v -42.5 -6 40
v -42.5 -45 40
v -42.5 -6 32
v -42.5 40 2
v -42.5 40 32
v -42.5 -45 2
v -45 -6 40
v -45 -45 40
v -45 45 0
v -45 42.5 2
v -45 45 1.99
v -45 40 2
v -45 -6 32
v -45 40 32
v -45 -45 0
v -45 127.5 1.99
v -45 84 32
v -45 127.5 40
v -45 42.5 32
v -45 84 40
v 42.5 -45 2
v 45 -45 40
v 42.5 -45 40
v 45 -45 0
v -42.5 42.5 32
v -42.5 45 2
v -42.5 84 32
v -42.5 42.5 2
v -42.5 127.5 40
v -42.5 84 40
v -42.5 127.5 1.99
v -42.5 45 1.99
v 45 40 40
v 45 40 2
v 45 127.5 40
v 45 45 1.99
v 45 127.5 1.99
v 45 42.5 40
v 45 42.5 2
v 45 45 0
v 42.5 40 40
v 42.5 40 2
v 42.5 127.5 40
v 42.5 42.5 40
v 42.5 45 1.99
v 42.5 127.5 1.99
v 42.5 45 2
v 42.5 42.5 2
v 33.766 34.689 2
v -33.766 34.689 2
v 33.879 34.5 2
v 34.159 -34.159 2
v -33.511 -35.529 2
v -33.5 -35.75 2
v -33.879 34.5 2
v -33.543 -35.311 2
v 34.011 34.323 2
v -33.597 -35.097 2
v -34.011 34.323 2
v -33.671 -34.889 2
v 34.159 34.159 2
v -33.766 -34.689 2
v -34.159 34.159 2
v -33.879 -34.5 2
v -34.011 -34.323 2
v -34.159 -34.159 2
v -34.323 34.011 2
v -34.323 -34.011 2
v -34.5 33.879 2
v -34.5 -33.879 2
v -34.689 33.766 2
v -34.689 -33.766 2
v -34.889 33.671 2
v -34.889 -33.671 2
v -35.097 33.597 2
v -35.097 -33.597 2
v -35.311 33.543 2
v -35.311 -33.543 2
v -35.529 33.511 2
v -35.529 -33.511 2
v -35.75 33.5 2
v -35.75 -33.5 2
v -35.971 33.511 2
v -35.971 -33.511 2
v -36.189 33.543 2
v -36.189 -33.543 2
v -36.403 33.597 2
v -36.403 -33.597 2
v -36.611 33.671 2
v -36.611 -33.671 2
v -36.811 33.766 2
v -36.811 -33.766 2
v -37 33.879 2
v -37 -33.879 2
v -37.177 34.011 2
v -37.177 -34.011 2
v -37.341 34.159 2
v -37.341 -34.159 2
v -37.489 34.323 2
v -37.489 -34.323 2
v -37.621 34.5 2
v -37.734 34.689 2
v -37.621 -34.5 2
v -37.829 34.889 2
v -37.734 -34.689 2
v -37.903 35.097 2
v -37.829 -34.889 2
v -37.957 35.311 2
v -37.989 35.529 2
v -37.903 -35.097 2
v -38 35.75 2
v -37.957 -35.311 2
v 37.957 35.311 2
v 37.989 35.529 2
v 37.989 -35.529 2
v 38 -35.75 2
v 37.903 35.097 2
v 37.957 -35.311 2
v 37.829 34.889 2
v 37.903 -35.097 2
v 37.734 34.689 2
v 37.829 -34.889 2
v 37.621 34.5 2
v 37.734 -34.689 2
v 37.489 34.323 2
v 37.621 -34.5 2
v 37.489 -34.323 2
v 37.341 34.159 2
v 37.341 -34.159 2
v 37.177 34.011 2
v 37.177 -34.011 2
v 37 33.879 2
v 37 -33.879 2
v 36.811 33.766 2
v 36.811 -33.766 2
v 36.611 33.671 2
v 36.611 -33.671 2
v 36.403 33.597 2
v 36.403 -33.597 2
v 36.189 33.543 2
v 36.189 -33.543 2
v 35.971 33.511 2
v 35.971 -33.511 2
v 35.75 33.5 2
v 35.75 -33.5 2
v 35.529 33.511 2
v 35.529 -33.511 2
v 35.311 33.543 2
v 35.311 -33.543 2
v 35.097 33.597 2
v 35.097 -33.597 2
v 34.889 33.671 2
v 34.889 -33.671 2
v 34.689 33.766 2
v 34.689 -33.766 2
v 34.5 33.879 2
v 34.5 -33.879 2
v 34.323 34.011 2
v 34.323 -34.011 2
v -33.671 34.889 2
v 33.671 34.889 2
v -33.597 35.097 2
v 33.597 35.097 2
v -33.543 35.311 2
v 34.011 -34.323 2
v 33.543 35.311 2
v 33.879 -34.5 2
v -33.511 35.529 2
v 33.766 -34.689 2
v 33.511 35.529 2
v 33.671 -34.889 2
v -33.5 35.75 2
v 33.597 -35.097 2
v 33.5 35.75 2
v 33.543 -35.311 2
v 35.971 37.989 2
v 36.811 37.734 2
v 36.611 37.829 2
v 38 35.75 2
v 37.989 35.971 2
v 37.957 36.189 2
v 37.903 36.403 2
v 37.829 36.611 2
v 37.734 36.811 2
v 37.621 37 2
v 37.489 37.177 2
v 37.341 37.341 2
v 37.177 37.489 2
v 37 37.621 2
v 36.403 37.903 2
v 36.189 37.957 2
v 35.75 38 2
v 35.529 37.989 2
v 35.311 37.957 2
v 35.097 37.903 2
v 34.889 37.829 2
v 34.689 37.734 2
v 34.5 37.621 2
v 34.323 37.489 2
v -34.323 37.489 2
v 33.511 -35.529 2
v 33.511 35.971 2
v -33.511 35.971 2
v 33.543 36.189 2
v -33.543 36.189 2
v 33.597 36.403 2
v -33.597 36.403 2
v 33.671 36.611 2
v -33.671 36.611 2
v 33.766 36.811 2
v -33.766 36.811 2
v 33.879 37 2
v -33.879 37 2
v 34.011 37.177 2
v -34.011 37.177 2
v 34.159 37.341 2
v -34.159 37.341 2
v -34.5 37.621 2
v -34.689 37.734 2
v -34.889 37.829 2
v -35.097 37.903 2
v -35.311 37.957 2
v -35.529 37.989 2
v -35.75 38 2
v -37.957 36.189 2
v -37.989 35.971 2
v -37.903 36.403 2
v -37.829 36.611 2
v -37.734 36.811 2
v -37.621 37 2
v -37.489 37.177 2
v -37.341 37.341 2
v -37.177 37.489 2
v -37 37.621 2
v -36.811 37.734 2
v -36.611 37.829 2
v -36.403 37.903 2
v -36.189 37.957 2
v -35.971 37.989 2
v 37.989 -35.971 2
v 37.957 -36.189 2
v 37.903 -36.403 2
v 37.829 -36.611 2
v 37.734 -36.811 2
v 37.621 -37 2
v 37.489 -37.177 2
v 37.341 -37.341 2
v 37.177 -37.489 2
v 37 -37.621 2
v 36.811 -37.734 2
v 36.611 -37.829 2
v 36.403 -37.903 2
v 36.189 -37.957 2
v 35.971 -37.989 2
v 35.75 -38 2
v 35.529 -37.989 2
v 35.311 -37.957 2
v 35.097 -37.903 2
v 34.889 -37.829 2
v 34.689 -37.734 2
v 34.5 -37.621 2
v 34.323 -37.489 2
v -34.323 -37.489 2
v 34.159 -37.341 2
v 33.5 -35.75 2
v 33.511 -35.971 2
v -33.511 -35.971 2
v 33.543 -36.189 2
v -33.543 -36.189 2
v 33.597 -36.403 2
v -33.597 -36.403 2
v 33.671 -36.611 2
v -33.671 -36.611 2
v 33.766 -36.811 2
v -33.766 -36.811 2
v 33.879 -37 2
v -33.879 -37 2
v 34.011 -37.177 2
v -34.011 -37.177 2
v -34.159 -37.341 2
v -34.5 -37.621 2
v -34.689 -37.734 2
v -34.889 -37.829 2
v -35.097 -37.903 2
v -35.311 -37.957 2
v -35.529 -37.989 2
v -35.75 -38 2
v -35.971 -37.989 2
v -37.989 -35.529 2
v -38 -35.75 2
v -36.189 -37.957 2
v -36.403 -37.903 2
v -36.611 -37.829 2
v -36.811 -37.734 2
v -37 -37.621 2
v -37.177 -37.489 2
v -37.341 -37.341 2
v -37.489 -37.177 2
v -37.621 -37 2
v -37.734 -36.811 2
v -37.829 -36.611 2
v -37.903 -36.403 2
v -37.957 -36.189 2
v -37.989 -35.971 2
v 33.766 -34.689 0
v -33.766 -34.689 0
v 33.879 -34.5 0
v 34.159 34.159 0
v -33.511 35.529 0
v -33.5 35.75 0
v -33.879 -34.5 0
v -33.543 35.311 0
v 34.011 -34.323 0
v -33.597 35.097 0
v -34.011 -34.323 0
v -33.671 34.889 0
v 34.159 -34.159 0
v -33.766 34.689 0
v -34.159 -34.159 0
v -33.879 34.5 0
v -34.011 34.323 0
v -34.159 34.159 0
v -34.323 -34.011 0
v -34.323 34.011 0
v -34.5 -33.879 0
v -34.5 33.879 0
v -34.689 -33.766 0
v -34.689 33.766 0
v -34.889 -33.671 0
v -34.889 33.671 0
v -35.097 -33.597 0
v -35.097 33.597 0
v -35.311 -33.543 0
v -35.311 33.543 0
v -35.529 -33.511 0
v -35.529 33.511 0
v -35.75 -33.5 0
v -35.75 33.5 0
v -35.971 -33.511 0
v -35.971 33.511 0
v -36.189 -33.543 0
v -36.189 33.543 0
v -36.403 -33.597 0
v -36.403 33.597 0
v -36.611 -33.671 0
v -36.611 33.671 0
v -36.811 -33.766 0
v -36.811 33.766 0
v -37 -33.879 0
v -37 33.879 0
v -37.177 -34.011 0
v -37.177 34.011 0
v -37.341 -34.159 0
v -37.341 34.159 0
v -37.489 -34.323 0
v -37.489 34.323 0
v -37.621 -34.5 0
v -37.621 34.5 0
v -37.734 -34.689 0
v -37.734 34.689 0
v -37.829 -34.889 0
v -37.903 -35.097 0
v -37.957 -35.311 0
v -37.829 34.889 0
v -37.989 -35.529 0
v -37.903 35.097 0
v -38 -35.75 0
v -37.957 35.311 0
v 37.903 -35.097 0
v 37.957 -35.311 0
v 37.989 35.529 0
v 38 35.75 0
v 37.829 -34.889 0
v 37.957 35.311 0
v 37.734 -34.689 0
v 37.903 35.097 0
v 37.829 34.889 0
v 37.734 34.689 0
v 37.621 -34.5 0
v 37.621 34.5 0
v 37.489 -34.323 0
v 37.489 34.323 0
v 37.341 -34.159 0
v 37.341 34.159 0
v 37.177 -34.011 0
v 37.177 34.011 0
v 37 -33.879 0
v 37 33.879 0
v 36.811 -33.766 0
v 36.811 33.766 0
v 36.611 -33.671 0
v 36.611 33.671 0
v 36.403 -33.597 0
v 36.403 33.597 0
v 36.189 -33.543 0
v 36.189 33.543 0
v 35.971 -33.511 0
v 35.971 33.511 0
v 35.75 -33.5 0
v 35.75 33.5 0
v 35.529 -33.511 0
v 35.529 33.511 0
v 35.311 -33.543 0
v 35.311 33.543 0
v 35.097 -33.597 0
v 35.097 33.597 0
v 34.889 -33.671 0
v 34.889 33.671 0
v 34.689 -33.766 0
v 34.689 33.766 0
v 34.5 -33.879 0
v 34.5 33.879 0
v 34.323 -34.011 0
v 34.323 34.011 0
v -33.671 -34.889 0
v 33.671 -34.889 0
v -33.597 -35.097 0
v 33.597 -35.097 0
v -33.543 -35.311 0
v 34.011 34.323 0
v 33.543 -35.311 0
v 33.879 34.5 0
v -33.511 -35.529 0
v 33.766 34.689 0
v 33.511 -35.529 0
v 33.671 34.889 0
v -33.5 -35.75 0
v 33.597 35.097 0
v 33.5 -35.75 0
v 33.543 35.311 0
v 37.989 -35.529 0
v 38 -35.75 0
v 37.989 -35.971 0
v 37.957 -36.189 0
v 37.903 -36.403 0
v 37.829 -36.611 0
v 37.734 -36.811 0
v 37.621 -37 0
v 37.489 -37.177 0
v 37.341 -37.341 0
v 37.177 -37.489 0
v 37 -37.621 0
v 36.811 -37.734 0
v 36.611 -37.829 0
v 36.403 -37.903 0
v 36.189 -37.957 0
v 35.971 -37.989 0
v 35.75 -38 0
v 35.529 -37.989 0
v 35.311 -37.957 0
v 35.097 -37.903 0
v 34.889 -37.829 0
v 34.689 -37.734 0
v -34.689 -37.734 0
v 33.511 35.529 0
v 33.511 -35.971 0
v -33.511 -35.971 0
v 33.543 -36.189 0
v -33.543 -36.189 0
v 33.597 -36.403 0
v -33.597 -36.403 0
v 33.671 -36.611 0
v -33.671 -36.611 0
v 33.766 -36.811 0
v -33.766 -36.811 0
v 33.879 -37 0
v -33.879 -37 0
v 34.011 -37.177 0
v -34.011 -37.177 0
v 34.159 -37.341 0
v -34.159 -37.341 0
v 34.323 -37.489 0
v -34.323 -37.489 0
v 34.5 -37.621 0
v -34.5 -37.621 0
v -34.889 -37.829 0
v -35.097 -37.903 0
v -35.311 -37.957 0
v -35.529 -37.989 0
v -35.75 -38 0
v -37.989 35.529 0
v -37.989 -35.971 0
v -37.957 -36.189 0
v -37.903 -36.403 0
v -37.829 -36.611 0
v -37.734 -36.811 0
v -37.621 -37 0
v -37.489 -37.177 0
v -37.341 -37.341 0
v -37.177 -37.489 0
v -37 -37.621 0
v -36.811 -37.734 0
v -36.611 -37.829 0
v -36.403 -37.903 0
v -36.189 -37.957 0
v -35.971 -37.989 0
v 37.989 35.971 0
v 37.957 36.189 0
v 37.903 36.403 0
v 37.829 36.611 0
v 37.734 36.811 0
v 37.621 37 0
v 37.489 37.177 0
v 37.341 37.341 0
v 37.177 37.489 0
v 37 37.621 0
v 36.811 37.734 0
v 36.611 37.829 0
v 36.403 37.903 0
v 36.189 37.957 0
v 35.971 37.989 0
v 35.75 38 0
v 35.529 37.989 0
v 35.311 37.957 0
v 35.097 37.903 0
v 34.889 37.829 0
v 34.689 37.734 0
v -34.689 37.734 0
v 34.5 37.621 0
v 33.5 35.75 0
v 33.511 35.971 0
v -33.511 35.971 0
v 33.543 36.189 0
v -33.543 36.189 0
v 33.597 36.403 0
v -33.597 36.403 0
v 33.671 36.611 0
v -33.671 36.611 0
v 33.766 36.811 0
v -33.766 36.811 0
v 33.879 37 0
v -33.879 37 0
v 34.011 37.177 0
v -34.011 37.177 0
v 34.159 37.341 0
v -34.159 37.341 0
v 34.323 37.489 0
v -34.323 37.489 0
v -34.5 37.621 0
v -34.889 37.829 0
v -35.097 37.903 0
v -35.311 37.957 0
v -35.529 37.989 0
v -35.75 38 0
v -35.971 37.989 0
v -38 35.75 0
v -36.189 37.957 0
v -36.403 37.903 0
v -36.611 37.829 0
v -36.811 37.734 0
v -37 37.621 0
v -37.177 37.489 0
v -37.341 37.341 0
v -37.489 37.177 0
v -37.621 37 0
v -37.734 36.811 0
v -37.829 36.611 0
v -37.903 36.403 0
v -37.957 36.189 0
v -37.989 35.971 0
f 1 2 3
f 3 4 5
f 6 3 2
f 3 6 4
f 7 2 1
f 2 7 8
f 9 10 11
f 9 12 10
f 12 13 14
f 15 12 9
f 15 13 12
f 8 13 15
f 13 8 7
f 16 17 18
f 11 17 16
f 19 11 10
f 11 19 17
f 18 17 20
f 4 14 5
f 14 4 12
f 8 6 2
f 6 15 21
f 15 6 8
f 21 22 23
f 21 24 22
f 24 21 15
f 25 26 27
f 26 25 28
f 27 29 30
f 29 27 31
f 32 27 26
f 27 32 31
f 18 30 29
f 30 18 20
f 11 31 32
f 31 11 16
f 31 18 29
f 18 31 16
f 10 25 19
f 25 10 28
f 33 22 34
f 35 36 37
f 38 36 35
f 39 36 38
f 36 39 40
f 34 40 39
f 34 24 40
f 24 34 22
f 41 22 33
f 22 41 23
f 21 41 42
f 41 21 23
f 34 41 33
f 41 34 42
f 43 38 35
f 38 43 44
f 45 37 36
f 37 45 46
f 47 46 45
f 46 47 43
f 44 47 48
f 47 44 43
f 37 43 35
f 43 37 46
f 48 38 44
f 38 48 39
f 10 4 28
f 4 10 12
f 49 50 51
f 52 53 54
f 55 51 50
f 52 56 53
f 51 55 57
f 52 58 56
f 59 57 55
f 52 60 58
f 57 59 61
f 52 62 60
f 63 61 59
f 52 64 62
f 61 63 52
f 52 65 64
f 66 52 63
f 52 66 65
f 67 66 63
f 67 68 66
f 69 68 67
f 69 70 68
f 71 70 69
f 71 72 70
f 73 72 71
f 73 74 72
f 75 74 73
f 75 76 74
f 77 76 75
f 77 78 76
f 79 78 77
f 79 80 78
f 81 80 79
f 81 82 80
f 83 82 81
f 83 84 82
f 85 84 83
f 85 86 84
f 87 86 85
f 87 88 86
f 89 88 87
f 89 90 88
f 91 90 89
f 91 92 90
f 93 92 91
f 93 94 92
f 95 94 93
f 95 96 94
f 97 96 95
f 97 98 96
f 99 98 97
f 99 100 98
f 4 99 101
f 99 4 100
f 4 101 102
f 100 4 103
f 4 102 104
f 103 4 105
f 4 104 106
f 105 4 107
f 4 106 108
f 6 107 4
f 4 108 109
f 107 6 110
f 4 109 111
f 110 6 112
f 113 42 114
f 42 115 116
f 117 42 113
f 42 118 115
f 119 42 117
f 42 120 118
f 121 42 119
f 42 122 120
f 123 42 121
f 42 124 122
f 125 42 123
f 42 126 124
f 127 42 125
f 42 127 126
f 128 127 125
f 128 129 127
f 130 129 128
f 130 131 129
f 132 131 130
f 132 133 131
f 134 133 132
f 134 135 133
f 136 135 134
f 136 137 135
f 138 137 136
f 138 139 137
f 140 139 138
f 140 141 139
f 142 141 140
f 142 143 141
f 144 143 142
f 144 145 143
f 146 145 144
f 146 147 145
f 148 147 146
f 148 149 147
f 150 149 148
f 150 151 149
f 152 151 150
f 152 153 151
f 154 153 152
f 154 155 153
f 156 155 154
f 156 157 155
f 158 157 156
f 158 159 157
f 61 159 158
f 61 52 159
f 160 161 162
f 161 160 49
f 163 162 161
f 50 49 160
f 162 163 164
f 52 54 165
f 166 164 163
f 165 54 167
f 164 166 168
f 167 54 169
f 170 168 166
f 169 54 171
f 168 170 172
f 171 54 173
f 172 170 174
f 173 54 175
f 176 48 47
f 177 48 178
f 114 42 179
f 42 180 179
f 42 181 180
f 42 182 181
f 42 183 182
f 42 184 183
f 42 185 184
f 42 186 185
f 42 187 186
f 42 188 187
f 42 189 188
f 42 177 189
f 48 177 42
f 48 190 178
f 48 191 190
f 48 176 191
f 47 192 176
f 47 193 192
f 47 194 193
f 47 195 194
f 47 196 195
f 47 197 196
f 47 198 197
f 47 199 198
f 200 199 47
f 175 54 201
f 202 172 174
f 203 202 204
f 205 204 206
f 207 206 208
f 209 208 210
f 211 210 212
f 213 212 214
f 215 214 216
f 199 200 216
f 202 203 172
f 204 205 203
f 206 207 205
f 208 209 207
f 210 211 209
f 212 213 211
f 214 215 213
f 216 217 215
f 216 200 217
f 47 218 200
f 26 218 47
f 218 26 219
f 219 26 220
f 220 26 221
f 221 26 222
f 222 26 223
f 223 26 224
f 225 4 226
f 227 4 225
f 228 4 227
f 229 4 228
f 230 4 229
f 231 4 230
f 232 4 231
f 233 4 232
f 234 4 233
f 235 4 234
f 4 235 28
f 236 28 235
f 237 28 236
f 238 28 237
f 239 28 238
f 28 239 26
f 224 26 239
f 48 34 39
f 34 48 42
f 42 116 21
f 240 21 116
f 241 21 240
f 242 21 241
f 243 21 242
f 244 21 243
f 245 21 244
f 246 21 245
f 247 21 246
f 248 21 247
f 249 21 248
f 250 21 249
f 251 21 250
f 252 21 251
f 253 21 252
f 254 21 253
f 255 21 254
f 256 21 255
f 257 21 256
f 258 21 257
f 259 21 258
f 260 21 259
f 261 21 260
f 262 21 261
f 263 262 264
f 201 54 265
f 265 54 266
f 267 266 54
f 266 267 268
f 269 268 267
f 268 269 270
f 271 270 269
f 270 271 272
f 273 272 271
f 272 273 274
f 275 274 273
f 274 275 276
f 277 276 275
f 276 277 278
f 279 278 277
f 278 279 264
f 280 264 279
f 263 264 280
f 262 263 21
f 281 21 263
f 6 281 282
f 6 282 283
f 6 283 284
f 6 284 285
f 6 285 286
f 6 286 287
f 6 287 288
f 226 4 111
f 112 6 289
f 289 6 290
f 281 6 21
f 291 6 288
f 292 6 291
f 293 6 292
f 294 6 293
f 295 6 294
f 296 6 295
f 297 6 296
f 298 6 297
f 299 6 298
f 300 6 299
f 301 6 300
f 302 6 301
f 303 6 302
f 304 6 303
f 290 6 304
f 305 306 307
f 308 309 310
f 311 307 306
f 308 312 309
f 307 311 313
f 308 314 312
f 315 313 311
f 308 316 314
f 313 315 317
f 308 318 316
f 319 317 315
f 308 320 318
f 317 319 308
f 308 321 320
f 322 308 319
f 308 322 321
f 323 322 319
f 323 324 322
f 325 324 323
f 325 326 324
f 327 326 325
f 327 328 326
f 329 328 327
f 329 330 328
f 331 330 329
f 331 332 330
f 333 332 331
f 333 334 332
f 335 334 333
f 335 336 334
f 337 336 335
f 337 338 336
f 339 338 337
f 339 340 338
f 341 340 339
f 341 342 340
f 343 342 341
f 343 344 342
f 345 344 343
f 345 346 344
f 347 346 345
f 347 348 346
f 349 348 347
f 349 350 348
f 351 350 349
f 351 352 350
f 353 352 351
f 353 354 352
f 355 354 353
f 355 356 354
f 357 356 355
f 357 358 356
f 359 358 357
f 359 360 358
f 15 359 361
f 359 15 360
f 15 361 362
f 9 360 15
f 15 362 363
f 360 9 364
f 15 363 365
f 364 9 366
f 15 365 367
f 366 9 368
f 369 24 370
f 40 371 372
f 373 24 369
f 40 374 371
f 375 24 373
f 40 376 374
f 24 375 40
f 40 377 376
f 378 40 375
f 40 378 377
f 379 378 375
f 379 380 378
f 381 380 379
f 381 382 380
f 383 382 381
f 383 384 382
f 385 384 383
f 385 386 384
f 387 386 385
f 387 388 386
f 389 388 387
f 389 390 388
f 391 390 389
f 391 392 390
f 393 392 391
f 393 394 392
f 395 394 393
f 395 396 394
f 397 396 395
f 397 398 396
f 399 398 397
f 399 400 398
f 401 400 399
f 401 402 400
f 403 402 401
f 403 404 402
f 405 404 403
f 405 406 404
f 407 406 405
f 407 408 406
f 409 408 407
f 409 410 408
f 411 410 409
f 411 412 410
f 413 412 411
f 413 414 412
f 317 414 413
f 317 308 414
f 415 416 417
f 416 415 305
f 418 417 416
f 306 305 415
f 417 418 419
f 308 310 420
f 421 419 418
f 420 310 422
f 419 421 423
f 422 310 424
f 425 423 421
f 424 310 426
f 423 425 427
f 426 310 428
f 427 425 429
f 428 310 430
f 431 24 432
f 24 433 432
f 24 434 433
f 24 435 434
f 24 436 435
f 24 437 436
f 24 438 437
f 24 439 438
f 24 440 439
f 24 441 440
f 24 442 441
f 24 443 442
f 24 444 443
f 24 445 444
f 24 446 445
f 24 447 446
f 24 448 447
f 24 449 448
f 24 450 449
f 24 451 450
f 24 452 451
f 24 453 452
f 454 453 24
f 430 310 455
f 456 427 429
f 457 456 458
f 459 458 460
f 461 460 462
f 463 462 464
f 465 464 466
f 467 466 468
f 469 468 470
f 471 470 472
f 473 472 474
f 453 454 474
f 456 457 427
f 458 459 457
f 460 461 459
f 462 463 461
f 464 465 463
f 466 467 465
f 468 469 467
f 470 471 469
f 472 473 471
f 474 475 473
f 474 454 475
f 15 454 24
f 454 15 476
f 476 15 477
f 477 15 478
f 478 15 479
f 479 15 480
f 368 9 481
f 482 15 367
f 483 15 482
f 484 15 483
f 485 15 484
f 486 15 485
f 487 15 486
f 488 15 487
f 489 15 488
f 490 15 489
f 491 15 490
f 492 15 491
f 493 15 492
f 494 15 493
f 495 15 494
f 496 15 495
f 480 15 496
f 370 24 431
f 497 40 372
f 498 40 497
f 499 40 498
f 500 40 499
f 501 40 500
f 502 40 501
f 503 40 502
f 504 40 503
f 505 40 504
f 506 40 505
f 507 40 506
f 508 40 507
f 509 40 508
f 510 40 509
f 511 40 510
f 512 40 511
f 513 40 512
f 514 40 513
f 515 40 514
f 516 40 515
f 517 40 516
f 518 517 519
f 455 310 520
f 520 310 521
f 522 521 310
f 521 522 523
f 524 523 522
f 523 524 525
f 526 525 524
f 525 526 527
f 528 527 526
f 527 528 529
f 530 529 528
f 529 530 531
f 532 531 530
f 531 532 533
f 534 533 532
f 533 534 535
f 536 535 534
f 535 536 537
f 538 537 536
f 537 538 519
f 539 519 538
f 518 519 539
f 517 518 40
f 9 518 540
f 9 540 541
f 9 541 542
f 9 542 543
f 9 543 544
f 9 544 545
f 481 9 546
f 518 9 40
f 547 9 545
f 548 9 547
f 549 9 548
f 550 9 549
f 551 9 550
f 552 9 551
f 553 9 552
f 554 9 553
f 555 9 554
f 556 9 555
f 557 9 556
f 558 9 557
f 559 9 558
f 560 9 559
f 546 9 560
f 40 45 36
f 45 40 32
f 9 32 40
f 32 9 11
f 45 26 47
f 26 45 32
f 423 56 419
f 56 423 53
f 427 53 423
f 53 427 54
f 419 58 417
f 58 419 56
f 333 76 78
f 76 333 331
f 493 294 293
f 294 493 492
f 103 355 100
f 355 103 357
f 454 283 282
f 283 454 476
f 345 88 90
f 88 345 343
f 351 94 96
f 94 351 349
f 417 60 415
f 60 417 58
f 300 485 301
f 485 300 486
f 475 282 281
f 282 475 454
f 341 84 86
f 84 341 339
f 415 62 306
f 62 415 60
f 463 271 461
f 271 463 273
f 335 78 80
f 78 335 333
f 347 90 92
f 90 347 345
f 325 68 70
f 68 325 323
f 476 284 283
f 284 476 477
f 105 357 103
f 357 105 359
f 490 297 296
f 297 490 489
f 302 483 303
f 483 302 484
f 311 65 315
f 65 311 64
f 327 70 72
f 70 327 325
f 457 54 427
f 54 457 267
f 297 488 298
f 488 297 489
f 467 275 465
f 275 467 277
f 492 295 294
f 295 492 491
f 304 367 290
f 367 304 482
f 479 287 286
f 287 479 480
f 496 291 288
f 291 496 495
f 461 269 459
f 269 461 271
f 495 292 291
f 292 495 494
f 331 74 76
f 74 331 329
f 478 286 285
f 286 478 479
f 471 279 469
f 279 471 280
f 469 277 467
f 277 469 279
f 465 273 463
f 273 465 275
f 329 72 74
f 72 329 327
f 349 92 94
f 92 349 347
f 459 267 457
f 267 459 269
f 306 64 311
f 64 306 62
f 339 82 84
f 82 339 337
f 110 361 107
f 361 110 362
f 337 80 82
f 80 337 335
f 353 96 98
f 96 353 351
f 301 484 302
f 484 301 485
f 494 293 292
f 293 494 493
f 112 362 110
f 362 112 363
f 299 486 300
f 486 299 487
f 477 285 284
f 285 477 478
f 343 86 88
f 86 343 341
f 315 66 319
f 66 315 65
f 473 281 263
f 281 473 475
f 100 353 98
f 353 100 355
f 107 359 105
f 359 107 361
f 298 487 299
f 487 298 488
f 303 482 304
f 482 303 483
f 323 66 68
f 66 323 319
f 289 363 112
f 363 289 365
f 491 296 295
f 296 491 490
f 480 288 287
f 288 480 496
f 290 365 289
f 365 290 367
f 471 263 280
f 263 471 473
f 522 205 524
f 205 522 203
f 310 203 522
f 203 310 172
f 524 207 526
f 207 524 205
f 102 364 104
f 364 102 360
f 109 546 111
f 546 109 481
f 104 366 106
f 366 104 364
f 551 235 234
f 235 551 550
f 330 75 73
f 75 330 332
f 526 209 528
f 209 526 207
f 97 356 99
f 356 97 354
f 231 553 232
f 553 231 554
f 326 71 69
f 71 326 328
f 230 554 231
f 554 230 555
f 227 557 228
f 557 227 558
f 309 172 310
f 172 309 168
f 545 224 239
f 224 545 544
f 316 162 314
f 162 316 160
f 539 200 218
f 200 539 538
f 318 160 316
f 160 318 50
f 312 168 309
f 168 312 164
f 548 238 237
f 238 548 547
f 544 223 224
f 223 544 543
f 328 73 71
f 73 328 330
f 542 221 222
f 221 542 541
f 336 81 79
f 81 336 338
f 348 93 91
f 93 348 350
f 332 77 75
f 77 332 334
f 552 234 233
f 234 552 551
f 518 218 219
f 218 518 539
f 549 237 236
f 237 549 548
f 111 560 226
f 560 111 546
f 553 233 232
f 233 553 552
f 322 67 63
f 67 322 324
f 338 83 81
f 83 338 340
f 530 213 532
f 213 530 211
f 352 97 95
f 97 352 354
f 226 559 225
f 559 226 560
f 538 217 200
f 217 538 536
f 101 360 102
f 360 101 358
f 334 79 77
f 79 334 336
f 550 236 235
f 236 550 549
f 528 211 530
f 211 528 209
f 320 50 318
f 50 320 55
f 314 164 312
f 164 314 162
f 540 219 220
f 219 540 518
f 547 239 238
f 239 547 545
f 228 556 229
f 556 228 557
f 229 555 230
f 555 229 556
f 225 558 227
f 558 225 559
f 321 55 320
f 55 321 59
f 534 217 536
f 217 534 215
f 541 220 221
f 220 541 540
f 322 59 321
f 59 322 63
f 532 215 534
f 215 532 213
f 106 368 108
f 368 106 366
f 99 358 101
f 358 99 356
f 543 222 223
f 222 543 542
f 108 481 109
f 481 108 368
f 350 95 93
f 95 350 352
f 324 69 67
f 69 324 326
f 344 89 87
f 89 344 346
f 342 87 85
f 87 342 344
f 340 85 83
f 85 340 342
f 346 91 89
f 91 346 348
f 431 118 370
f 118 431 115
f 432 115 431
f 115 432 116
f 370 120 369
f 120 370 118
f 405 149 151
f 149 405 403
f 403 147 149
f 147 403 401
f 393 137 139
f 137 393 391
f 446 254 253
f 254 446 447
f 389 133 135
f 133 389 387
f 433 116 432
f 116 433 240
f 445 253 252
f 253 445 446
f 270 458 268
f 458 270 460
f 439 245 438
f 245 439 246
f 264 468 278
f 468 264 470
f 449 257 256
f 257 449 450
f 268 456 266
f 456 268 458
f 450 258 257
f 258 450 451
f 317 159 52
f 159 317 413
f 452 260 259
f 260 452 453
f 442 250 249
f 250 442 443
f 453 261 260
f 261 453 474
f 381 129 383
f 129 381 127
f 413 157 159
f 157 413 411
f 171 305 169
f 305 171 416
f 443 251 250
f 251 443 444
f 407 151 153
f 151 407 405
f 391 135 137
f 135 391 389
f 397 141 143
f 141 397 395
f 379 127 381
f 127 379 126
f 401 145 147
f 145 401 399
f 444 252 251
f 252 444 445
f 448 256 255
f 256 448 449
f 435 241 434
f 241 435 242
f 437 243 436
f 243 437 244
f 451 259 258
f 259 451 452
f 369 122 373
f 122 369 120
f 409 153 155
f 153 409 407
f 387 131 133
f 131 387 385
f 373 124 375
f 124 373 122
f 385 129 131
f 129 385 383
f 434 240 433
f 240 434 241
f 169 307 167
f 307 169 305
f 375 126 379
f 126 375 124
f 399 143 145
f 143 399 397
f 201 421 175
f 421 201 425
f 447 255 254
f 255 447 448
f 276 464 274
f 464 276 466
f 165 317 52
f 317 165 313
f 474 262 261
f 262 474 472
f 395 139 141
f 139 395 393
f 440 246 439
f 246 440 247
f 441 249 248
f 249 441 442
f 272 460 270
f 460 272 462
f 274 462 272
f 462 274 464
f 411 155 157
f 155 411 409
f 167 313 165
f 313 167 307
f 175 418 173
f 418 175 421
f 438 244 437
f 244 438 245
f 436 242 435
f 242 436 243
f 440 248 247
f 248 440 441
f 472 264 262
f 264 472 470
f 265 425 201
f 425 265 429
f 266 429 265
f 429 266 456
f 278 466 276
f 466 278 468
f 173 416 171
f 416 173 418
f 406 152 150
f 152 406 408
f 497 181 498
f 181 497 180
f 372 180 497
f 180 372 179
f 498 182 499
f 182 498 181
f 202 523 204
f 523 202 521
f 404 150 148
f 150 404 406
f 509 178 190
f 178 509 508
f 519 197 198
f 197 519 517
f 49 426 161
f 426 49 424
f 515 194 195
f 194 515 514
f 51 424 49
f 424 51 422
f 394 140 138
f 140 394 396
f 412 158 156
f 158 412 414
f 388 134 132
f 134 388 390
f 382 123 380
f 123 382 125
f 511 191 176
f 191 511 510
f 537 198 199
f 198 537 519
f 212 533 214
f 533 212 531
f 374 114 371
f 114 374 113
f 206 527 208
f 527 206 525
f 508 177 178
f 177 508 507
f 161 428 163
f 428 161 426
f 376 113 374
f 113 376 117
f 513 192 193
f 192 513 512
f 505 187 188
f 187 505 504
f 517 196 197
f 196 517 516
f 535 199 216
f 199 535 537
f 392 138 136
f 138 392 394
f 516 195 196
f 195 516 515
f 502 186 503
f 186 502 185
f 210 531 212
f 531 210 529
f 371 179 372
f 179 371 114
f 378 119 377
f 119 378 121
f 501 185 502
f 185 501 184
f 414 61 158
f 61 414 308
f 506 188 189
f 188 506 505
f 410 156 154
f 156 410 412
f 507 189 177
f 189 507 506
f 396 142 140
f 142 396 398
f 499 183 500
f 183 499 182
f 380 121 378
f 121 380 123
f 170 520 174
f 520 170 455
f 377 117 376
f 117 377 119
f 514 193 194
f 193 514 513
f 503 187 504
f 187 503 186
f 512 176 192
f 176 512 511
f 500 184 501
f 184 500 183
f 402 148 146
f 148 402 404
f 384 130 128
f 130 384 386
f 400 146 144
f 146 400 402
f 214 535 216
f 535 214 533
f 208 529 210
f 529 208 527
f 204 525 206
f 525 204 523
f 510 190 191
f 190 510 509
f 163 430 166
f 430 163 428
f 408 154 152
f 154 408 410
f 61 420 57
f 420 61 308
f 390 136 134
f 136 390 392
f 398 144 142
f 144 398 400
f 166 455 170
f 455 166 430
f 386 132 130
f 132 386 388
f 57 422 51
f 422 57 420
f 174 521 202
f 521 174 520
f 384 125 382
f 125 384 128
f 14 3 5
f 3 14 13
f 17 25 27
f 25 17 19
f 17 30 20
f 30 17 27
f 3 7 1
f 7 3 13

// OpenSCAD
// DIY magnetic stirrer housing for 80 mm PC case fan
// Print orientation: top plate on bed (z = 0), walls build upward (+Z)
// Note: this is the "upside-down" open-box orientation specified

// ---------- Dimensions (mm) ----------
outer_x      = 90;    // outer size in X
outer_y      = 90;    // outer size in Y
plate_t      = 2;     // top plate thickness (z = 0 to 2)
wall_t       = 2.5;   // wall thickness
box_h        = 40;    // outer wall height (top edge at z = 40)
hole_d       = 4.5;   // M4 screw hole diameter
hole_pitch   = 71.5;  // square pattern centre-to-centre distance
notch_w      = 12;    // cable notch width
notch_depth  = 8;     // cable notch depth from open edge (z = 32 to 40)
eps          = 0.5;   // cutter overshoot past faces

$fn = 64;             // curve resolution

// ---------- Model ----------
difference() {
    union() {
        // Top plate
        translate([-outer_x/2, -outer_y/2, 0])
            cube([outer_x, outer_y, plate_t]);

        // Four walls rising from the top edge of the plate
        for (x = [-1, 1], y = [-1, 1])
            translate([x > 0 ? outer_x/2 - wall_t : -outer_x/2,
                       y > 0 ? outer_y/2 - wall_t : -outer_y/2,
                       plate_t - 0.01])
                cube([wall_t, outer_y - 2*wall_t, box_h - plate_t + 0.01]);
    }

    // Screw holes through the top plate on a 71.5 mm square pattern
    for (s = [-1, 1])
        for (t = [-1, 1])
            translate([s * hole_pitch/2, t * hole_pitch/2, -eps])
                cylinder(d = hole_d, h = plate_t + 2*eps);

    // Cable notch cut into one wall, reaching down from the open edge
    translate([-outer_x/2, -notch_w/2, box_h - notch_depth])
        cube([notch_w, outer_y, notch_depth + eps]);
}
